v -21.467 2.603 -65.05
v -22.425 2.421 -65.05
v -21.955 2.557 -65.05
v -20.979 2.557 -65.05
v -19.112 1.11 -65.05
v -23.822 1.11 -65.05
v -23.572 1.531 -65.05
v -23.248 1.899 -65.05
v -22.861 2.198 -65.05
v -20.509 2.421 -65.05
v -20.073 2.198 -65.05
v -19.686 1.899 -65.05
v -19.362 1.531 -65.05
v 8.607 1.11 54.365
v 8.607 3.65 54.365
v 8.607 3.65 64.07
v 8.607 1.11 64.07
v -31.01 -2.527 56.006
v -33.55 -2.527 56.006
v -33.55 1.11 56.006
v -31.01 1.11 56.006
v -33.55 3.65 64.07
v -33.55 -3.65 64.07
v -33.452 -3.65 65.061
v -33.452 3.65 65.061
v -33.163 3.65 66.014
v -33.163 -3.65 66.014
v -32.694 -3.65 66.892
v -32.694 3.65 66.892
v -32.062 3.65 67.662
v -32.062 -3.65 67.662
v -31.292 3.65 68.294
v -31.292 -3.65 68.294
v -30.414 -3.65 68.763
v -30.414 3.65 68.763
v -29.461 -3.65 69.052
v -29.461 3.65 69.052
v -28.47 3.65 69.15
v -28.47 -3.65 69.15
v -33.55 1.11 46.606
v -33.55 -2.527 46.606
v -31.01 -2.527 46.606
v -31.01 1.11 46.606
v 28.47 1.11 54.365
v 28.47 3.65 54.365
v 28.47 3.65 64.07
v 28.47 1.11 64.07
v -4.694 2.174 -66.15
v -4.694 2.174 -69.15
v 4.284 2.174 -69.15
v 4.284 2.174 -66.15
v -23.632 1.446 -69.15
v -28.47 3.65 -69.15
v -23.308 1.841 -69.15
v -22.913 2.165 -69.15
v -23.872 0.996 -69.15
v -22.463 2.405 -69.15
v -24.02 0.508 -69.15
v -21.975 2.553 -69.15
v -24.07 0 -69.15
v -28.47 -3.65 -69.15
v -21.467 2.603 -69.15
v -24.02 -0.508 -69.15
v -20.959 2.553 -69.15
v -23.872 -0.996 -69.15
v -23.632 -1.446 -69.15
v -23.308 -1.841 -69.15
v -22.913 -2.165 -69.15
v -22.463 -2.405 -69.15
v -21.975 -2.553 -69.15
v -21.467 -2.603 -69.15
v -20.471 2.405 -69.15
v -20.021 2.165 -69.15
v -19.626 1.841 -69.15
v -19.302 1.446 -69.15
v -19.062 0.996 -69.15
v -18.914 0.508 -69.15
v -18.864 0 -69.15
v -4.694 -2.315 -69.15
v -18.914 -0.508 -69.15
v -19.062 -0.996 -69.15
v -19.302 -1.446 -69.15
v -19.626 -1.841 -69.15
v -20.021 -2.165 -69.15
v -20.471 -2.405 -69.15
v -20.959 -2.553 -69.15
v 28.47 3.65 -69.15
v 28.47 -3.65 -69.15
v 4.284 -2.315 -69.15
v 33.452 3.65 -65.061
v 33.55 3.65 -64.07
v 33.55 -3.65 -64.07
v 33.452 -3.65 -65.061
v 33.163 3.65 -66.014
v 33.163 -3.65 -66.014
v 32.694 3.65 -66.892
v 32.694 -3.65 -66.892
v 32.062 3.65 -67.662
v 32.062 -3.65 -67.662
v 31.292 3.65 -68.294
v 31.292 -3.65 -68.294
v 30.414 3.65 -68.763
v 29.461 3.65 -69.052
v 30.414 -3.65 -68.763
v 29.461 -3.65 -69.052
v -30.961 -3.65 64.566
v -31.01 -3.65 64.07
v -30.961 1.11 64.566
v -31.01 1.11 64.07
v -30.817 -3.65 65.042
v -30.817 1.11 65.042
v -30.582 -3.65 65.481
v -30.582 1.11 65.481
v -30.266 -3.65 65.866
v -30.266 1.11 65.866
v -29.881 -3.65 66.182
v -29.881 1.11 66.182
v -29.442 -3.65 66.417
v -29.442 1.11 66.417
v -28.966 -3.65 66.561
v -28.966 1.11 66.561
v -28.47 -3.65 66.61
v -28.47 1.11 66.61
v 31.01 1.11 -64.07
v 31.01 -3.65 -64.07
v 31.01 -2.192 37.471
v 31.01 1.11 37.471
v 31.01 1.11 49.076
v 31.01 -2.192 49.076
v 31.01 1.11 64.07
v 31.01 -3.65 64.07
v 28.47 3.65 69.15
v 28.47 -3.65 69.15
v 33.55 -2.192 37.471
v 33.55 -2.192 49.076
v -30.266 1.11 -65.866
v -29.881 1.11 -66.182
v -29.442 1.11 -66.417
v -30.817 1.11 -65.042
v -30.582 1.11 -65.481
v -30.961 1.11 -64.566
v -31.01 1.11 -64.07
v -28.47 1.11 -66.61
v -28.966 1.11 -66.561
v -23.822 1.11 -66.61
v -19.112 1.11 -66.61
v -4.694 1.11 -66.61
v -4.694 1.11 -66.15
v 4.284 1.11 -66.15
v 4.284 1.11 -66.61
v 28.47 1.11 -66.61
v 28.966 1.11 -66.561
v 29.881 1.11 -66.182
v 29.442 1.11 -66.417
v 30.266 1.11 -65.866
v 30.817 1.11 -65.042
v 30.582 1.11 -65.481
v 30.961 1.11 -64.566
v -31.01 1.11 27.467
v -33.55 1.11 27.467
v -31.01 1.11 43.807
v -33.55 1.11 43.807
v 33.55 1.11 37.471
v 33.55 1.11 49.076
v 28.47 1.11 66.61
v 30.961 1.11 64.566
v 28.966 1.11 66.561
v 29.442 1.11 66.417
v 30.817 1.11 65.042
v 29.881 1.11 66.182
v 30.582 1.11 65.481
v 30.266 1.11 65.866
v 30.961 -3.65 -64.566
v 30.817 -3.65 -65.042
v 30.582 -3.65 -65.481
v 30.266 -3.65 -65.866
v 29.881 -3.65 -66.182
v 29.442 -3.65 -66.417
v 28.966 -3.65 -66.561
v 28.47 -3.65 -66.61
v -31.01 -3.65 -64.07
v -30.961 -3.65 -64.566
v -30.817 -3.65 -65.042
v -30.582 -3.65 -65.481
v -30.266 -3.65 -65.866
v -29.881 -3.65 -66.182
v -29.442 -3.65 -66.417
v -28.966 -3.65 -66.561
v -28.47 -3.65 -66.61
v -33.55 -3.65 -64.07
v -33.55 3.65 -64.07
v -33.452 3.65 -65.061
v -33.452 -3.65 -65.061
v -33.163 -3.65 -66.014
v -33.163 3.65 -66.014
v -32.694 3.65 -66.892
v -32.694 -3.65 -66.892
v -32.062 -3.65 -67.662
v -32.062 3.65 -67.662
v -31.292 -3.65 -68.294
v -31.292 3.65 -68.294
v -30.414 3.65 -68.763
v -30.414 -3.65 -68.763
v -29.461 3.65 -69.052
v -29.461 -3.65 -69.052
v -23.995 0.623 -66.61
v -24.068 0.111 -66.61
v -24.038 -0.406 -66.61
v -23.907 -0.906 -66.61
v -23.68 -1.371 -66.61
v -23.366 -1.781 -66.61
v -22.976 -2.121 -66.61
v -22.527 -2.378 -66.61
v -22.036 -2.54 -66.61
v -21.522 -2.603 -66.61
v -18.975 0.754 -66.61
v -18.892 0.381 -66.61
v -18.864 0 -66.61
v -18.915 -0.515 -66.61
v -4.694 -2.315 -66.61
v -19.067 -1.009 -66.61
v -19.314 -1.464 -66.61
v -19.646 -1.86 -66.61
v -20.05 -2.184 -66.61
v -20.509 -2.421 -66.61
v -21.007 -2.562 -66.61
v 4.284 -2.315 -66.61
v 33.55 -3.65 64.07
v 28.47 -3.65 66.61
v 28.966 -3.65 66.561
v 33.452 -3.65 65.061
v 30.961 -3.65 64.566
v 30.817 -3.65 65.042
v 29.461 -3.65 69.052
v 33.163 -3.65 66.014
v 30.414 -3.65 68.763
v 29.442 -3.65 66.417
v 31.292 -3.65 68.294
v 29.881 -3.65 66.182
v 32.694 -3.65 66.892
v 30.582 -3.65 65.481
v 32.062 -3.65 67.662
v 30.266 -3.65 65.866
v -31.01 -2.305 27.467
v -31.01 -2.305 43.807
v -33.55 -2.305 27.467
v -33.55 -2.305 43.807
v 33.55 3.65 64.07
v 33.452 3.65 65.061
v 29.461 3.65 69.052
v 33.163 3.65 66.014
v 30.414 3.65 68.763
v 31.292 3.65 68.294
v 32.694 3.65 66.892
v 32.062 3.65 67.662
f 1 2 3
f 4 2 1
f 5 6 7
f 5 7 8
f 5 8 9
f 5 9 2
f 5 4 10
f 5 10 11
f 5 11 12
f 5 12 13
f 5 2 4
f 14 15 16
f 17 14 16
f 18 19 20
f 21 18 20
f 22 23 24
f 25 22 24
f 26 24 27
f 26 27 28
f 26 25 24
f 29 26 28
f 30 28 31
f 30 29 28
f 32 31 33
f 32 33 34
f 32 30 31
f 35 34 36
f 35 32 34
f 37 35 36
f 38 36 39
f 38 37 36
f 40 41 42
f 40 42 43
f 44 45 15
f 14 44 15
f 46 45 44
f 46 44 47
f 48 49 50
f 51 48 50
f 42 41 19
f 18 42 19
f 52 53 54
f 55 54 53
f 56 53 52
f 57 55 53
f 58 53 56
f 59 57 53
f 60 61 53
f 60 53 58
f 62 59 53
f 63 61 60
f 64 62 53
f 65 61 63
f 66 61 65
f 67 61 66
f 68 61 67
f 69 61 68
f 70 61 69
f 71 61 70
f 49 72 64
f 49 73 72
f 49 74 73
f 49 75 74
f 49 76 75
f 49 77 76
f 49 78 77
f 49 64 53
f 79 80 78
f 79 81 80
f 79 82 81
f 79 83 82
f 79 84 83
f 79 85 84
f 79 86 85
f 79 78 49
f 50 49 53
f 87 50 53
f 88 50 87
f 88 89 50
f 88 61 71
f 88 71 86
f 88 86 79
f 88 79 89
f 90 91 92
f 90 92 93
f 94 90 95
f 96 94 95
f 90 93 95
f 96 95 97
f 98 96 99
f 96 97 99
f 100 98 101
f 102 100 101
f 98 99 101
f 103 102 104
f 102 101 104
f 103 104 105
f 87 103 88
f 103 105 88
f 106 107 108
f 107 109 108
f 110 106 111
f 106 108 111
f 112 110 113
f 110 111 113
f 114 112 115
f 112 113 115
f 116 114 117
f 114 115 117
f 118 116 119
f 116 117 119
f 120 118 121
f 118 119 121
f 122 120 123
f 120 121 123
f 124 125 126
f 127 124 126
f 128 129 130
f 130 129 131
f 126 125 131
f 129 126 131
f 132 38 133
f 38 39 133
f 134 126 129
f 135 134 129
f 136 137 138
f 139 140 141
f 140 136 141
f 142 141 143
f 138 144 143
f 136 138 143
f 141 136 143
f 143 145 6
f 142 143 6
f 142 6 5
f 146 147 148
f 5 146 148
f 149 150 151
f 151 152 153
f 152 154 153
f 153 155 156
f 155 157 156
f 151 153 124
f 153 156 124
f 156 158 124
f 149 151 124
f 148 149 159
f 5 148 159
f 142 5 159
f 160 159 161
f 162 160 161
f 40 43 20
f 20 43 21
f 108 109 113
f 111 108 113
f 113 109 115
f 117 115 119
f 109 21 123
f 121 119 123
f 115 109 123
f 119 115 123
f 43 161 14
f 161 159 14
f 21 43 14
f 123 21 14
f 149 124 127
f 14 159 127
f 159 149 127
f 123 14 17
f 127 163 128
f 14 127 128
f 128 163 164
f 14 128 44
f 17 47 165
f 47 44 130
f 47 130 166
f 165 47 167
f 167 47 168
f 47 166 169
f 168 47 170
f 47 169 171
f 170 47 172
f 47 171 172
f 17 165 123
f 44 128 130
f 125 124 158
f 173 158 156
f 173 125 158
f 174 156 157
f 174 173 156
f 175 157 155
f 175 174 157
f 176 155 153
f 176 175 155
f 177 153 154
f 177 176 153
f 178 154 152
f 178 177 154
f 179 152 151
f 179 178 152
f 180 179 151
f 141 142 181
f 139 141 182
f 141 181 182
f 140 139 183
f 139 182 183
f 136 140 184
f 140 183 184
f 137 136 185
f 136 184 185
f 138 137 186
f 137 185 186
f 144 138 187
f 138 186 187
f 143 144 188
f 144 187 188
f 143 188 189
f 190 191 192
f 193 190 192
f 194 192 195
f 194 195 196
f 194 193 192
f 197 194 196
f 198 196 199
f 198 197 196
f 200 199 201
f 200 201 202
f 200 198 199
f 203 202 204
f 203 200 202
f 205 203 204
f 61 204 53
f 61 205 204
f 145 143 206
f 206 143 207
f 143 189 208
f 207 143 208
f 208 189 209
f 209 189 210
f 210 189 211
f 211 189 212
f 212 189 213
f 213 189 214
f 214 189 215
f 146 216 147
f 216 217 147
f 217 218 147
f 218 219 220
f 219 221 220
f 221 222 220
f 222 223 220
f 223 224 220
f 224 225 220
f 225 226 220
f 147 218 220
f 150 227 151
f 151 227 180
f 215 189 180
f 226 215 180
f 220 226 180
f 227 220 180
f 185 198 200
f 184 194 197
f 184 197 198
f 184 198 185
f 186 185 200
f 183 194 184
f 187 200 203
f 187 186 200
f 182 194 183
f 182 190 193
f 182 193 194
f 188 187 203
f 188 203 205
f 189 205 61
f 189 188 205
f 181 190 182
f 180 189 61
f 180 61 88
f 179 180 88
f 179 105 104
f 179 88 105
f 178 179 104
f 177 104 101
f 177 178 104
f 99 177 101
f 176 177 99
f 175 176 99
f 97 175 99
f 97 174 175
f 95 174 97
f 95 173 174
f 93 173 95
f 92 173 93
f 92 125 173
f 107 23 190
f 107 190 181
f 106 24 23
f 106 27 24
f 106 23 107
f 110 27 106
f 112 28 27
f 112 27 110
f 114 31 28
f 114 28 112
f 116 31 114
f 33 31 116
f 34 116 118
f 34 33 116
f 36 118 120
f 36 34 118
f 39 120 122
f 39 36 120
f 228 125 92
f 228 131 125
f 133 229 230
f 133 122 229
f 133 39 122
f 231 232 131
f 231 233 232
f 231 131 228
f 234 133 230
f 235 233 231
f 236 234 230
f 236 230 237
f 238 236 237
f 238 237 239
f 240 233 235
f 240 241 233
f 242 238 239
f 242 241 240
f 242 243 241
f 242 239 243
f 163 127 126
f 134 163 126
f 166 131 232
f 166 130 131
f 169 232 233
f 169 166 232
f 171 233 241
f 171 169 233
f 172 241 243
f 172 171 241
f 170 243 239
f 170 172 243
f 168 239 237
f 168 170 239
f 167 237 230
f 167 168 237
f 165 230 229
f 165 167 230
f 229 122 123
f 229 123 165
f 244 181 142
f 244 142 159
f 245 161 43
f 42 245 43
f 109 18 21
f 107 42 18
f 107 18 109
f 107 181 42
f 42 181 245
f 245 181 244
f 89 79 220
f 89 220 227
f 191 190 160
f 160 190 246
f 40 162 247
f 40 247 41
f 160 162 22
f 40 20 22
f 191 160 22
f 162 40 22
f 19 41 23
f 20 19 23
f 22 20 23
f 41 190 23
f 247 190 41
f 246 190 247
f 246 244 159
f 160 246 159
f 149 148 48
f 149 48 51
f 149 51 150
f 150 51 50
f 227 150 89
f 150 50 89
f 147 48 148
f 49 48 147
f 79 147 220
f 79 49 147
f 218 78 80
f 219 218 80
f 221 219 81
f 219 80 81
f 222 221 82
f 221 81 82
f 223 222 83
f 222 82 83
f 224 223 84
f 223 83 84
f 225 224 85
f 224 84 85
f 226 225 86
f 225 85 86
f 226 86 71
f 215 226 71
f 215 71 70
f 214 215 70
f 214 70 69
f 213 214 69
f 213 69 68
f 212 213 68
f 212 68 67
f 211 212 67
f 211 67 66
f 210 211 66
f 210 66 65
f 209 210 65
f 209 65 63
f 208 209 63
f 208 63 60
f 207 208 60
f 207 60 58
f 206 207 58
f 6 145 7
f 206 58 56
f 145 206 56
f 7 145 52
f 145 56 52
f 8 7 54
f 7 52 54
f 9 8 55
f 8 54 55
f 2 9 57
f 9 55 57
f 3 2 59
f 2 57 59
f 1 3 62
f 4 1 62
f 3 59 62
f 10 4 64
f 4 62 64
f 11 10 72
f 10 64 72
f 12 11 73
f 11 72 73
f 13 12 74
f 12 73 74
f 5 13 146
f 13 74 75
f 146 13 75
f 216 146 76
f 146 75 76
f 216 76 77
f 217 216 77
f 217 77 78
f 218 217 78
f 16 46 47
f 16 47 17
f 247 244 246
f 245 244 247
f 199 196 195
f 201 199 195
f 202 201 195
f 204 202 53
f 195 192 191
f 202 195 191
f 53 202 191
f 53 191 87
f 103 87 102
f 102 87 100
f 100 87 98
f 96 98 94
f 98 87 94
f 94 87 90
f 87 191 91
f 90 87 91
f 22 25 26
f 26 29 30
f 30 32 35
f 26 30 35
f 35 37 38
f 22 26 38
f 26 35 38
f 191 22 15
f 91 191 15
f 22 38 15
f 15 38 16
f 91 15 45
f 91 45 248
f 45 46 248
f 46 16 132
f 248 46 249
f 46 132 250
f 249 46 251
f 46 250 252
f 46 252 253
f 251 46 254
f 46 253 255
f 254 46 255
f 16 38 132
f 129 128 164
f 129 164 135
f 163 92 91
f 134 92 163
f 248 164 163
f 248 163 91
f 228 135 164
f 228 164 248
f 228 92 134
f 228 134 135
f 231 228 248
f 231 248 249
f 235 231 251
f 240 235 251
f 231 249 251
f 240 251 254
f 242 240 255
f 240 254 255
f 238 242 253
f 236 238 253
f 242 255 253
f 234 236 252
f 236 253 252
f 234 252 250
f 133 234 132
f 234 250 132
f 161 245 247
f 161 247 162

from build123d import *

# Parameters (mm, degrees)
F0_W      = 67.1
F0_H      = 138.3
F1_DEPTH  = 3.65
F2_R      = 5.08
F3_T      = -2.54
F4_W      = 19.863441
F4_H      = 9.705244
F5_DEPTH  = 12.5
F6_W      = 8.977096
F6_H      = 4.488549
F7_DEPTH  = 3
F8_W      = 3.636948
F8_H      = 9.400487
F8_W_2    = 3.415418
F8_H_2    = 16.339872
F9_DEPTH  = 8.3
F10_W     = 3.30219
F10_H     = 11.60476
F11_DEPTH = 4.7
F13_R     = 2.60328
F14_DEPTH = 4.1


with BuildPart() as f1:
    # F0 (on Front) → F1 (new body, symmetric)
    with BuildSketch(Plane.XZ):
        Rectangle(F0_W, F0_H)
    extrude(amount=F1_DEPTH, both=True)

    # F2
    f2_edges = [f1.edges().sort_by_distance(p)[0] for p in [
        (-33.55, 0, 69.15),
        (33.55, 0, 69.15),
        (33.55, 0, -69.15),
        (-33.55, 0, -69.15),
    ]]
    fillet(f2_edges, radius=F2_R)

    # F3
    f3_openings = [f1.faces().sort_by_distance(p)[0] for p in [
        (0, -3.65, 0),
    ]]
    offset(amount=F3_T, openings=f3_openings)

    # F4 (on face) → F5 (cut, symmetric)
    with BuildSketch(Plane(origin=(0, 3.65, 0), x_dir=(-1, 0, 0), z_dir=(0, 1, 0))):
        with Locations((-18.538279, 59.217378)):
            Rectangle(F4_W, F4_H)
    extrude(amount=F5_DEPTH, both=True, mode=Mode.SUBTRACT)

    # F6 (on face) → F7 (cut)
    with BuildSketch(Plane(origin=(0, 0, -69.15), x_dir=(1, 0, 0), z_dir=(0, 0, -1))):
        with Locations((-0.205018, 0.07035)):
            Rectangle(F6_W, F6_H)
    extrude(amount=-F7_DEPTH, mode=Mode.SUBTRACT)

    # F8 (on face) → F9 (cut, symmetric)
    with BuildSketch(Plane.YZ.offset(-31.01)):
        with Locations((-0.708474, 51.305823)):
            Rectangle(F8_W, F8_H)
        with Locations((-0.597709, 35.637243)):
            Rectangle(F8_W_2, F8_H_2)
    extrude(amount=F9_DEPTH, both=True, mode=Mode.SUBTRACT)

    # F10 (on face) → F11 (cut, symmetric)
    with BuildSketch(Plane(origin=(31.01, 0, 0), x_dir=(0, -1, 0), z_dir=(-1, 0, 0))):
        with Locations((0.541095, 43.273276)):
            Rectangle(F10_W, F10_H)
    extrude(amount=F11_DEPTH, both=True, mode=Mode.SUBTRACT)

    # F13 (on face) → F14 (cut, symmetric)
    with BuildSketch(Plane(origin=(0, 0, -69.15), x_dir=(1, 0, 0), z_dir=(0, 0, -1))):
        with Locations((-21.467019, 0)):
            Circle(F13_R)
    extrude(amount=F14_DEPTH, both=True, mode=Mode.SUBTRACT)


solid = f1.part
